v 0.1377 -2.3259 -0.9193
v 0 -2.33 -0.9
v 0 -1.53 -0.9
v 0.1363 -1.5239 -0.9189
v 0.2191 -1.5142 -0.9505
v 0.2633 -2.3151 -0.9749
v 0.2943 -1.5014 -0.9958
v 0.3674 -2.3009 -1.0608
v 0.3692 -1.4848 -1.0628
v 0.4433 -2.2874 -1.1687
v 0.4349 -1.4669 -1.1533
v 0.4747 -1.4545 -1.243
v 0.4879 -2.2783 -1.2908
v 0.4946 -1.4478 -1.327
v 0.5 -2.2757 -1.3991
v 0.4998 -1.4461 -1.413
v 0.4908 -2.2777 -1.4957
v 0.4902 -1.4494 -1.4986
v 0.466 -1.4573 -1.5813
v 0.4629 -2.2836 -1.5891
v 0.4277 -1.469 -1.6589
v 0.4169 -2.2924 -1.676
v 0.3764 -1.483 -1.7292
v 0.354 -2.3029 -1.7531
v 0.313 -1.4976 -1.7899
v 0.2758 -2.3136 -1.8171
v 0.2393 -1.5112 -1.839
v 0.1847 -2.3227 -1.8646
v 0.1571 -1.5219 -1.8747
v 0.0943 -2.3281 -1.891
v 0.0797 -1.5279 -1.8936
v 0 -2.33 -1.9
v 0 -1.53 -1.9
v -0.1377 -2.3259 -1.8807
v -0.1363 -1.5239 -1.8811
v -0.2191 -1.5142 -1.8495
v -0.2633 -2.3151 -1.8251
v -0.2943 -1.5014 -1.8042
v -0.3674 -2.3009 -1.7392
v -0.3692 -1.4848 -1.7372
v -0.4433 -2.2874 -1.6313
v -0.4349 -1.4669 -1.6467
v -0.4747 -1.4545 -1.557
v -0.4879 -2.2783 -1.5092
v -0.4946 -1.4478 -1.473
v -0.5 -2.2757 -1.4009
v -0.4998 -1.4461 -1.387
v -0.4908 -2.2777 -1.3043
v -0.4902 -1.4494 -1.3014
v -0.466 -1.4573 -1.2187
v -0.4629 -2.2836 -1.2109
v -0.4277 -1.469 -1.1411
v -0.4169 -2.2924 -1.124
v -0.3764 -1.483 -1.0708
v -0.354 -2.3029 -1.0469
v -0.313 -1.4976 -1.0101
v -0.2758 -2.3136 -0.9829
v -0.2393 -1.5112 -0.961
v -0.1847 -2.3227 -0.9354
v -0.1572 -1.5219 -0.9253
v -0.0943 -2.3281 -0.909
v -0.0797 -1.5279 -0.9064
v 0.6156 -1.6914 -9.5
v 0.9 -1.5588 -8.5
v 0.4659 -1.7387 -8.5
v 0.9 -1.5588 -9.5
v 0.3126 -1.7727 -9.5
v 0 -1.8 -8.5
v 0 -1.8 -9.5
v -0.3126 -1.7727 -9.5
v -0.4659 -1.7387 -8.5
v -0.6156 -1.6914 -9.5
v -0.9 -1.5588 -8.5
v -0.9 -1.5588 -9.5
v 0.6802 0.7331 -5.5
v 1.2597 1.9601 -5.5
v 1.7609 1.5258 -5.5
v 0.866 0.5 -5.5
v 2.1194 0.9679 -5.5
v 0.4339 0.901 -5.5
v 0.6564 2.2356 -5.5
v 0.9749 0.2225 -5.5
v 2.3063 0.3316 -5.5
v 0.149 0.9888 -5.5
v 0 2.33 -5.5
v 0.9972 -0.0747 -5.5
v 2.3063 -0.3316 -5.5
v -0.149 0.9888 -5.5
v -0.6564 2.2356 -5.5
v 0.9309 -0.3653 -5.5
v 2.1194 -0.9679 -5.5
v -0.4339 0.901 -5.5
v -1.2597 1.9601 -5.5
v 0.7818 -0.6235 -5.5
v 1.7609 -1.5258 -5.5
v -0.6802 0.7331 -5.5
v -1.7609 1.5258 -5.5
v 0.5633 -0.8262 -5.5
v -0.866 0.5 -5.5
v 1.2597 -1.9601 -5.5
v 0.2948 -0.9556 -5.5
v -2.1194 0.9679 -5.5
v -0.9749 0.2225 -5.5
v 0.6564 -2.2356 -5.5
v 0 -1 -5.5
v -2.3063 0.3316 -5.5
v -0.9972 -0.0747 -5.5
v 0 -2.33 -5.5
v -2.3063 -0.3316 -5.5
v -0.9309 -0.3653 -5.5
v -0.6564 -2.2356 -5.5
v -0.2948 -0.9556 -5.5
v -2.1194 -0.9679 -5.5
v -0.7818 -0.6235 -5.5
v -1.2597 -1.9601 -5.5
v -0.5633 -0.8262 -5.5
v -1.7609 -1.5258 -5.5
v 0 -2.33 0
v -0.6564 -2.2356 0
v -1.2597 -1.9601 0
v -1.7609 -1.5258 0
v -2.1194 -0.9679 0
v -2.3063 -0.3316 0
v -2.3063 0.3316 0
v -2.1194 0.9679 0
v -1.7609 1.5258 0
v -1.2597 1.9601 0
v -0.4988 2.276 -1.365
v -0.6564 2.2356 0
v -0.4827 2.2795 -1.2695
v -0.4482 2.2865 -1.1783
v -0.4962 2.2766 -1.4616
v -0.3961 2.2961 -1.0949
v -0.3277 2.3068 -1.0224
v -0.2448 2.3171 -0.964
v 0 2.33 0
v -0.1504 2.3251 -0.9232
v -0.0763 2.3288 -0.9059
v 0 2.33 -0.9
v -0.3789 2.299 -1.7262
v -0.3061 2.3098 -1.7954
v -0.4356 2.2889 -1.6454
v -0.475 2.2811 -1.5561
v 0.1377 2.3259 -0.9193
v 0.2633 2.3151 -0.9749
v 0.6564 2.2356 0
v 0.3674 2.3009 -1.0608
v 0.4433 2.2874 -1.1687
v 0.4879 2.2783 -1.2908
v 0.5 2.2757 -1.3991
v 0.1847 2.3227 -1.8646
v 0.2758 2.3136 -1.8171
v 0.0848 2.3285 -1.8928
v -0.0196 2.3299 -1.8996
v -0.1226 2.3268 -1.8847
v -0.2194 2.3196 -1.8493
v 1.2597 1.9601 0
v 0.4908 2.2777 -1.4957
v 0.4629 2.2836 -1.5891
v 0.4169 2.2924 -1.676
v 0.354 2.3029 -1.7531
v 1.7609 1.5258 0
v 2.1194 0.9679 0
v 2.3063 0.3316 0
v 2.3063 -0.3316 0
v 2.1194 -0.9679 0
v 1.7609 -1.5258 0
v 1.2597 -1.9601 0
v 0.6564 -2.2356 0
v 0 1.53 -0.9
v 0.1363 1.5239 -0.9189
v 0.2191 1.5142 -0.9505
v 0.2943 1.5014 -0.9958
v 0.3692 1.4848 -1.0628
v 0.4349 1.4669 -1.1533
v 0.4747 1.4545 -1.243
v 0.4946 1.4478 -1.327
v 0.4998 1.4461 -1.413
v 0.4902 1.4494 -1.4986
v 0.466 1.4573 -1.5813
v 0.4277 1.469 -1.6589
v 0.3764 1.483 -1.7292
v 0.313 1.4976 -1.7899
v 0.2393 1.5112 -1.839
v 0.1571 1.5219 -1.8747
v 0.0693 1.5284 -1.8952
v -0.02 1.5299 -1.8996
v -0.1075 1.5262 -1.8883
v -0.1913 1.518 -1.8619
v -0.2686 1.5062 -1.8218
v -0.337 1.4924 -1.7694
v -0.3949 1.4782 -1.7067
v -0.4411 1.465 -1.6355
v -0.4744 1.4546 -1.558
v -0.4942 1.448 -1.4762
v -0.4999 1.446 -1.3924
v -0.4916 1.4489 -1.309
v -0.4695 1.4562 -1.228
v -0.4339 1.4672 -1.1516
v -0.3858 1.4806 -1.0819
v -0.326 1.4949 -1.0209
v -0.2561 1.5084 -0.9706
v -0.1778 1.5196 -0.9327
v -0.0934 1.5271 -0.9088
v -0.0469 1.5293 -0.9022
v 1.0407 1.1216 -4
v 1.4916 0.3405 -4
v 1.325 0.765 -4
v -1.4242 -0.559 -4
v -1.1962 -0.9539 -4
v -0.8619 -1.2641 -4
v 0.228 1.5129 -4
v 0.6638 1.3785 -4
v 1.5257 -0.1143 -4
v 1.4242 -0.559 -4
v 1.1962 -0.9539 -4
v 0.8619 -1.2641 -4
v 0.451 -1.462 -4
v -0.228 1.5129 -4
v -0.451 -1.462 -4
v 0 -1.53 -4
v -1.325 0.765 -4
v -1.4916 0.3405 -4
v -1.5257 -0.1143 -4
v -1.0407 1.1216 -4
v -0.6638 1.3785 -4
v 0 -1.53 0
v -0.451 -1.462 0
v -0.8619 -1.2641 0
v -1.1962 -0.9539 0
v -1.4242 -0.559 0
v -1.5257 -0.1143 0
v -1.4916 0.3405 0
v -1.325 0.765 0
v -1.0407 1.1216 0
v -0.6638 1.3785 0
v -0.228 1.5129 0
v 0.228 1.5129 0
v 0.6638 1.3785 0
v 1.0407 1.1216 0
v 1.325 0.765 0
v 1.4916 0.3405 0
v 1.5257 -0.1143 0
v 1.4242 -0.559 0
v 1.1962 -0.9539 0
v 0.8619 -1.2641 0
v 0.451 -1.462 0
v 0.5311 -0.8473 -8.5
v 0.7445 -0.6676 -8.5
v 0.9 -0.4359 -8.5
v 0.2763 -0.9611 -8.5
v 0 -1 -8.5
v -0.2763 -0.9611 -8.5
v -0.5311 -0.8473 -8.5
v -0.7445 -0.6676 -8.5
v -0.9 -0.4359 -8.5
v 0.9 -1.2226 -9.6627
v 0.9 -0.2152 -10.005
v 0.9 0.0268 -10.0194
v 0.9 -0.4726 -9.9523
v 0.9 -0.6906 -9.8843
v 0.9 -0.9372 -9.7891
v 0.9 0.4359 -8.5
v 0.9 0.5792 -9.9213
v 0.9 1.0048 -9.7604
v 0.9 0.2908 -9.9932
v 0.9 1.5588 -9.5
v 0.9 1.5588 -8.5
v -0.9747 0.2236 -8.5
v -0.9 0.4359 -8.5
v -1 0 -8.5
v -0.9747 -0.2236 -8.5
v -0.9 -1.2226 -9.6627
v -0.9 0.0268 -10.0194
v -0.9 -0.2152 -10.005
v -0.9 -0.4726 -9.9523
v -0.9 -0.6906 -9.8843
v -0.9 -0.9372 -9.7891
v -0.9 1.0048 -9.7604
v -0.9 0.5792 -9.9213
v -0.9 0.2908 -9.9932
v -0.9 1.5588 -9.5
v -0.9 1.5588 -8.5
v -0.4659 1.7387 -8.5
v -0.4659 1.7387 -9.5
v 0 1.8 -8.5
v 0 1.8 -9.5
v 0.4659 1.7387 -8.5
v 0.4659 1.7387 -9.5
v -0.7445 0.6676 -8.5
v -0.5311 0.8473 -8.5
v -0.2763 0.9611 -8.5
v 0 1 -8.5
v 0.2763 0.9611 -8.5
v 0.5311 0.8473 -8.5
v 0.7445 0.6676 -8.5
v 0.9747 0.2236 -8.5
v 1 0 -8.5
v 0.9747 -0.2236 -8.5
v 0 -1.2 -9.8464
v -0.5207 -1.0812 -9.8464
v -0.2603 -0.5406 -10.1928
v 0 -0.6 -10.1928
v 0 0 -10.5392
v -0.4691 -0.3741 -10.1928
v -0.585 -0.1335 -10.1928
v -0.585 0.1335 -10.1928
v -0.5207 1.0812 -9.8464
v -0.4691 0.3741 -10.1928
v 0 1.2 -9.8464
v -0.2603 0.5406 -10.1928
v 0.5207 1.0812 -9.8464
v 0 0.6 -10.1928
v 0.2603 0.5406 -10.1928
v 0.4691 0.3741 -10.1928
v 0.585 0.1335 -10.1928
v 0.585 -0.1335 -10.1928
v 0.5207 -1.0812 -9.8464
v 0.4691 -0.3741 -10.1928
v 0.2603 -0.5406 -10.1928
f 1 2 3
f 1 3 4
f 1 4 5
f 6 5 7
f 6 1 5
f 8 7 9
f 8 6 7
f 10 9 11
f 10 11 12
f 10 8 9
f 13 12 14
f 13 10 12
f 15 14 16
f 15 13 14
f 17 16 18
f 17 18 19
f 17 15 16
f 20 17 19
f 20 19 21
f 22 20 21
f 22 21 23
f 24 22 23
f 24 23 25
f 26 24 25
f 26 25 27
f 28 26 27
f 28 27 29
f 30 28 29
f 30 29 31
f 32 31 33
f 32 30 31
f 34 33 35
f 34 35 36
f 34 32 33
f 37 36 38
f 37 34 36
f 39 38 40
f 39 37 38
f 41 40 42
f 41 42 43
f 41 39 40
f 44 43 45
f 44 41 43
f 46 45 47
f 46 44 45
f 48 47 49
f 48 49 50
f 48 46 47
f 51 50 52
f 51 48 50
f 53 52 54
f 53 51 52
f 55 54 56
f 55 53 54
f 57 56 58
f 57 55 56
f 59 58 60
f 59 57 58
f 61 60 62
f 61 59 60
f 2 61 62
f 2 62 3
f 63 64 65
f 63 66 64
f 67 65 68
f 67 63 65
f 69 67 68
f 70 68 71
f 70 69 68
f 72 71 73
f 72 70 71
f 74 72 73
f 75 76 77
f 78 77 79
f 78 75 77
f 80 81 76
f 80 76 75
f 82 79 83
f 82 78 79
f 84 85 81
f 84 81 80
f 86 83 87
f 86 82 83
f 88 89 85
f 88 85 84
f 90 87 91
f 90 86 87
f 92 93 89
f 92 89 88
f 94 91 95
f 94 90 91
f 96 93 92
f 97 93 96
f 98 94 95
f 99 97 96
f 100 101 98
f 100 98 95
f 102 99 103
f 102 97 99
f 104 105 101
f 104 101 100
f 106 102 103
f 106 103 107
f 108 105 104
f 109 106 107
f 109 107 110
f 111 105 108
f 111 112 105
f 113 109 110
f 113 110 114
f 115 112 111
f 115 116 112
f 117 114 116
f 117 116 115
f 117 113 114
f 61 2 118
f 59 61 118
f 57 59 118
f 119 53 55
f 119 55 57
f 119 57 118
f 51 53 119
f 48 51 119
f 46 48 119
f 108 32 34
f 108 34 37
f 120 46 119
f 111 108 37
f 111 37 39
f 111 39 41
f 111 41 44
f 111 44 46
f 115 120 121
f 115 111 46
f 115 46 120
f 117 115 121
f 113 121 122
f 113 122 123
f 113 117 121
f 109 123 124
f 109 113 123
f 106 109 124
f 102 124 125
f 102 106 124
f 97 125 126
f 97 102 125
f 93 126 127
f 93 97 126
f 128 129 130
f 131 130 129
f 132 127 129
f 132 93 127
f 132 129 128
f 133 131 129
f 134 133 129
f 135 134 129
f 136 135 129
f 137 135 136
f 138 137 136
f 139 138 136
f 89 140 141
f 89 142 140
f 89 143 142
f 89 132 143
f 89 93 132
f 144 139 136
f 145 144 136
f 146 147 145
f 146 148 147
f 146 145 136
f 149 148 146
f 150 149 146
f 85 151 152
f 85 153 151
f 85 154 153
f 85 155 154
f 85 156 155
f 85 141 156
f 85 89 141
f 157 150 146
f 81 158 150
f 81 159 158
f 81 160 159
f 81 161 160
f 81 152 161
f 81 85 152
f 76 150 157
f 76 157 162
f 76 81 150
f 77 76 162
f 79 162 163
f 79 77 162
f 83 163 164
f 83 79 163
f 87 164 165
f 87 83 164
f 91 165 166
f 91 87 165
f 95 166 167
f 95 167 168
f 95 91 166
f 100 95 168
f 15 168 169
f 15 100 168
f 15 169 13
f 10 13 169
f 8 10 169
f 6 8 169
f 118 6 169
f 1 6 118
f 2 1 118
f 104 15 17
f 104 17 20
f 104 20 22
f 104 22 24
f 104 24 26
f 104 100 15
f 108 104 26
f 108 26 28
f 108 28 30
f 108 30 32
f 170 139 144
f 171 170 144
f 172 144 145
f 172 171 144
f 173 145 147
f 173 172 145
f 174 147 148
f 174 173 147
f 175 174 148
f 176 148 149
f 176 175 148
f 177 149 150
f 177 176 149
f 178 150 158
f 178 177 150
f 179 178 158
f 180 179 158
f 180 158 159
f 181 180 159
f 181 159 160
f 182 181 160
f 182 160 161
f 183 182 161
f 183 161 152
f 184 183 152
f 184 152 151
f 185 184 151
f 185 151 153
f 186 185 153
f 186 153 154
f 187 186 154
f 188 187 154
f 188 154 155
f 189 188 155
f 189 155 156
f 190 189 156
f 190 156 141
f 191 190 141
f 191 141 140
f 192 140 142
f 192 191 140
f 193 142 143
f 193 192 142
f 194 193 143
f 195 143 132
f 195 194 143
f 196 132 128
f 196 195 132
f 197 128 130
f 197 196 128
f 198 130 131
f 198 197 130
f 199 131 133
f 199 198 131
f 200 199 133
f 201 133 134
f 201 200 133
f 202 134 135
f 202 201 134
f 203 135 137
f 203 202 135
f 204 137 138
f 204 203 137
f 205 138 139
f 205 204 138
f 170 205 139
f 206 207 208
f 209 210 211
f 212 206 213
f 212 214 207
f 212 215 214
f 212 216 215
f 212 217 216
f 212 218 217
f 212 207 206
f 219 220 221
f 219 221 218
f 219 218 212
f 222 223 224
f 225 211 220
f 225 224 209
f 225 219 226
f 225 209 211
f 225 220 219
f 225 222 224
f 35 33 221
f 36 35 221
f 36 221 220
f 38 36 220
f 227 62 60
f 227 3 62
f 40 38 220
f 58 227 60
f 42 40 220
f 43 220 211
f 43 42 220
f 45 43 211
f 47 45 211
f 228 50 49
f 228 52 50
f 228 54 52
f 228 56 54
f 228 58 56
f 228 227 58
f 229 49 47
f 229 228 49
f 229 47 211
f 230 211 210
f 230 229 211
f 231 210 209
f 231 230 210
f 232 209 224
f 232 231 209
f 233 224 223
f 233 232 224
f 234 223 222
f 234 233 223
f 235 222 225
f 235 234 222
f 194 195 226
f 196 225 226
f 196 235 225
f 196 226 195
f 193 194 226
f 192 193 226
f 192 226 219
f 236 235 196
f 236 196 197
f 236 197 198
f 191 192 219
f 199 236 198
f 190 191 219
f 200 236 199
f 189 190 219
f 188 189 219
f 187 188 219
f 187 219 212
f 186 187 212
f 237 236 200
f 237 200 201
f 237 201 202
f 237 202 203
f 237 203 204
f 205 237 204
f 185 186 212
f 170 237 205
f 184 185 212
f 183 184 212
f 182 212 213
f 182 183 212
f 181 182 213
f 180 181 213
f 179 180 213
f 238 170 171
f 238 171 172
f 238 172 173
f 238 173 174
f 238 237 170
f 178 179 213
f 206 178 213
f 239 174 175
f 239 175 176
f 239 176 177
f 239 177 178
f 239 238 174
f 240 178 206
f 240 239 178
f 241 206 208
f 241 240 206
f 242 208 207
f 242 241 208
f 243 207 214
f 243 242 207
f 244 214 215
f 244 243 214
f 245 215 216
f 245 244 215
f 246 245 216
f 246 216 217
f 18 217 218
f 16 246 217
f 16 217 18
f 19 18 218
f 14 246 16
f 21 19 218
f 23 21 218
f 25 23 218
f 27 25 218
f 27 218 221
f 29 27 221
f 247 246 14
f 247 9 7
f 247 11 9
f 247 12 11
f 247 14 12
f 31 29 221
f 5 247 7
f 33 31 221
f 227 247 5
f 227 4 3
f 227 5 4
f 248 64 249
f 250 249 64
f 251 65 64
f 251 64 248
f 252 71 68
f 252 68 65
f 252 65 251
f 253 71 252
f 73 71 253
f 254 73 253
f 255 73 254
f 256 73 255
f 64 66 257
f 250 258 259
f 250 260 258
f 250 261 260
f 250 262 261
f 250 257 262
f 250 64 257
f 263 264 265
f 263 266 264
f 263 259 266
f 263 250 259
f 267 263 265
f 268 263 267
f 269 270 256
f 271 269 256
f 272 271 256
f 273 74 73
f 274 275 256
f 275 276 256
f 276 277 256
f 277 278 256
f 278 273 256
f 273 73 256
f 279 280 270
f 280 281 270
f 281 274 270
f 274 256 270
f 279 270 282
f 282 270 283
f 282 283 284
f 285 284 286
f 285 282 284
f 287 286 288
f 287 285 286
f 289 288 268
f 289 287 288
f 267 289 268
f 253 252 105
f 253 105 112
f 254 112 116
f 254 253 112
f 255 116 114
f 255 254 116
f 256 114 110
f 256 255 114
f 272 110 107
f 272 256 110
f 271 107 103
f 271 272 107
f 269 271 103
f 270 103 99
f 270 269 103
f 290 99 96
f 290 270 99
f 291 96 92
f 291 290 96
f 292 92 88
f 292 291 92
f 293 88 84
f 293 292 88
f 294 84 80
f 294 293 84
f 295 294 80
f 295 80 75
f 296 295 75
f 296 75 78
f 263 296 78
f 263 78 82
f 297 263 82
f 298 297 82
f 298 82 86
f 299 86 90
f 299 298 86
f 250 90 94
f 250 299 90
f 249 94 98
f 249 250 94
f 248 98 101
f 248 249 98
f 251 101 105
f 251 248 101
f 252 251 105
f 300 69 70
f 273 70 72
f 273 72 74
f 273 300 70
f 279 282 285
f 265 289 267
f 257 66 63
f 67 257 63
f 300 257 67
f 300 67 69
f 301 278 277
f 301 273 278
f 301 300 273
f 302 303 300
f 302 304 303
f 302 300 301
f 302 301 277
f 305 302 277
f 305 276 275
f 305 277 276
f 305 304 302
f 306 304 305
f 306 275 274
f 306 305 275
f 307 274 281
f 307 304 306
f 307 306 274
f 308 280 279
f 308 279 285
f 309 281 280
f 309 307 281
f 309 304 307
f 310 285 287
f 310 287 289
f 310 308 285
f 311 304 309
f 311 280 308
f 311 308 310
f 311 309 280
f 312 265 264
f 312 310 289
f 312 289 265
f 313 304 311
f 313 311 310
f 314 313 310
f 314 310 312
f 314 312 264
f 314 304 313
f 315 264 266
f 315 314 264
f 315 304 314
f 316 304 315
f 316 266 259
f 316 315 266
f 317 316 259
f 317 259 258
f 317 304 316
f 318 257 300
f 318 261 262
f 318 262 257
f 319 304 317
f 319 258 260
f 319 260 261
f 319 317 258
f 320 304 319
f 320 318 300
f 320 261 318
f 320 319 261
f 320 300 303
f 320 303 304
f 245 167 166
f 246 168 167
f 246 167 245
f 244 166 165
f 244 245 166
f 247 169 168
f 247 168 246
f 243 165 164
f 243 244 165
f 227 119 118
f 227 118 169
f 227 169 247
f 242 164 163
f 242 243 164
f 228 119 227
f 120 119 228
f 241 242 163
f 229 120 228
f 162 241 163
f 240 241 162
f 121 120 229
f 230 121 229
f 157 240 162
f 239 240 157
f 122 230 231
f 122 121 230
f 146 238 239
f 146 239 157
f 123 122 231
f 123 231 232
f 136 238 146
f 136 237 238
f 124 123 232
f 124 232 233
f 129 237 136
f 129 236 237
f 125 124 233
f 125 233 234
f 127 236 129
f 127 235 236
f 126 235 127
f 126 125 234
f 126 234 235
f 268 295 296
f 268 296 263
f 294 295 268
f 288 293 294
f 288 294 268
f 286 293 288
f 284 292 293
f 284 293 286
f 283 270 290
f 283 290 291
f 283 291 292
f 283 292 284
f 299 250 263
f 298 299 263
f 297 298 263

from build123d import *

# Parameters (mm, degrees)
CUT_EXTRUDE1_START      = -8.5
SKETCH2_W               = 5
SKETCH2_H               = 10
CUT_EXTRUDE1_DEPTH      = 3.542335768
CUT_EXTRUDE2_DEPTH      = 12.042335768
CUT_EXTRUDE2_DEPTH_BACK = 12.042335768
SKETCH3_R               = 0.5


with BuildPart() as part:
    # Sketch1 → Revolve1 (revolve)
    with BuildSketch(Plane(origin=(0, 0, 0), x_dir=(0, 0, -1), z_dir=(1, 0, 0)), mode=Mode.PRIVATE) as revolve1_sk:
        Polygon((0, 2.33), (5.5, 2.33), (5.5, 1), (8.5, 1), (8.5, 1.8), (9.5, 1.8), (10.539230485, 0), (4, 0), (4, 1.53), (0, 1.53), align=None)
    revolve(revolve1_sk.sketch.rotate(Axis((0, 0, 2.965537871), (0, 0, -1)), 180), axis=Axis((0, 0, 2.965537871), (0, 0, -1)))

    # Sketch2 → Cut-Extrude1 (cut, through all)
    with BuildSketch(Plane.XY.offset(CUT_EXTRUDE1_START)):
        with Locations((3.4, 0)):
            Rectangle(SKETCH2_W, SKETCH2_H)
        with Locations((-3.4, 0)):
            Rectangle(SKETCH2_W, SKETCH2_H)
    extrude(amount=-CUT_EXTRUDE1_DEPTH, mode=Mode.SUBTRACT)

    # Sketch3 → Cut-Extrude2 (cut, two sides: drawn at the far end of the back side and taken through both)
    with BuildSketch(Plane(origin=(0, 0, 0), x_dir=(1, 0, 0), z_dir=(0, 1, 0)).offset(-CUT_EXTRUDE2_DEPTH_BACK)):
        with Locations(Location((0, 1.4, 0), (0, 0, 270))):
            Circle(SKETCH3_R)
    extrude(amount=CUT_EXTRUDE2_DEPTH + CUT_EXTRUDE2_DEPTH_BACK, mode=Mode.SUBTRACT)


solid = part.part
